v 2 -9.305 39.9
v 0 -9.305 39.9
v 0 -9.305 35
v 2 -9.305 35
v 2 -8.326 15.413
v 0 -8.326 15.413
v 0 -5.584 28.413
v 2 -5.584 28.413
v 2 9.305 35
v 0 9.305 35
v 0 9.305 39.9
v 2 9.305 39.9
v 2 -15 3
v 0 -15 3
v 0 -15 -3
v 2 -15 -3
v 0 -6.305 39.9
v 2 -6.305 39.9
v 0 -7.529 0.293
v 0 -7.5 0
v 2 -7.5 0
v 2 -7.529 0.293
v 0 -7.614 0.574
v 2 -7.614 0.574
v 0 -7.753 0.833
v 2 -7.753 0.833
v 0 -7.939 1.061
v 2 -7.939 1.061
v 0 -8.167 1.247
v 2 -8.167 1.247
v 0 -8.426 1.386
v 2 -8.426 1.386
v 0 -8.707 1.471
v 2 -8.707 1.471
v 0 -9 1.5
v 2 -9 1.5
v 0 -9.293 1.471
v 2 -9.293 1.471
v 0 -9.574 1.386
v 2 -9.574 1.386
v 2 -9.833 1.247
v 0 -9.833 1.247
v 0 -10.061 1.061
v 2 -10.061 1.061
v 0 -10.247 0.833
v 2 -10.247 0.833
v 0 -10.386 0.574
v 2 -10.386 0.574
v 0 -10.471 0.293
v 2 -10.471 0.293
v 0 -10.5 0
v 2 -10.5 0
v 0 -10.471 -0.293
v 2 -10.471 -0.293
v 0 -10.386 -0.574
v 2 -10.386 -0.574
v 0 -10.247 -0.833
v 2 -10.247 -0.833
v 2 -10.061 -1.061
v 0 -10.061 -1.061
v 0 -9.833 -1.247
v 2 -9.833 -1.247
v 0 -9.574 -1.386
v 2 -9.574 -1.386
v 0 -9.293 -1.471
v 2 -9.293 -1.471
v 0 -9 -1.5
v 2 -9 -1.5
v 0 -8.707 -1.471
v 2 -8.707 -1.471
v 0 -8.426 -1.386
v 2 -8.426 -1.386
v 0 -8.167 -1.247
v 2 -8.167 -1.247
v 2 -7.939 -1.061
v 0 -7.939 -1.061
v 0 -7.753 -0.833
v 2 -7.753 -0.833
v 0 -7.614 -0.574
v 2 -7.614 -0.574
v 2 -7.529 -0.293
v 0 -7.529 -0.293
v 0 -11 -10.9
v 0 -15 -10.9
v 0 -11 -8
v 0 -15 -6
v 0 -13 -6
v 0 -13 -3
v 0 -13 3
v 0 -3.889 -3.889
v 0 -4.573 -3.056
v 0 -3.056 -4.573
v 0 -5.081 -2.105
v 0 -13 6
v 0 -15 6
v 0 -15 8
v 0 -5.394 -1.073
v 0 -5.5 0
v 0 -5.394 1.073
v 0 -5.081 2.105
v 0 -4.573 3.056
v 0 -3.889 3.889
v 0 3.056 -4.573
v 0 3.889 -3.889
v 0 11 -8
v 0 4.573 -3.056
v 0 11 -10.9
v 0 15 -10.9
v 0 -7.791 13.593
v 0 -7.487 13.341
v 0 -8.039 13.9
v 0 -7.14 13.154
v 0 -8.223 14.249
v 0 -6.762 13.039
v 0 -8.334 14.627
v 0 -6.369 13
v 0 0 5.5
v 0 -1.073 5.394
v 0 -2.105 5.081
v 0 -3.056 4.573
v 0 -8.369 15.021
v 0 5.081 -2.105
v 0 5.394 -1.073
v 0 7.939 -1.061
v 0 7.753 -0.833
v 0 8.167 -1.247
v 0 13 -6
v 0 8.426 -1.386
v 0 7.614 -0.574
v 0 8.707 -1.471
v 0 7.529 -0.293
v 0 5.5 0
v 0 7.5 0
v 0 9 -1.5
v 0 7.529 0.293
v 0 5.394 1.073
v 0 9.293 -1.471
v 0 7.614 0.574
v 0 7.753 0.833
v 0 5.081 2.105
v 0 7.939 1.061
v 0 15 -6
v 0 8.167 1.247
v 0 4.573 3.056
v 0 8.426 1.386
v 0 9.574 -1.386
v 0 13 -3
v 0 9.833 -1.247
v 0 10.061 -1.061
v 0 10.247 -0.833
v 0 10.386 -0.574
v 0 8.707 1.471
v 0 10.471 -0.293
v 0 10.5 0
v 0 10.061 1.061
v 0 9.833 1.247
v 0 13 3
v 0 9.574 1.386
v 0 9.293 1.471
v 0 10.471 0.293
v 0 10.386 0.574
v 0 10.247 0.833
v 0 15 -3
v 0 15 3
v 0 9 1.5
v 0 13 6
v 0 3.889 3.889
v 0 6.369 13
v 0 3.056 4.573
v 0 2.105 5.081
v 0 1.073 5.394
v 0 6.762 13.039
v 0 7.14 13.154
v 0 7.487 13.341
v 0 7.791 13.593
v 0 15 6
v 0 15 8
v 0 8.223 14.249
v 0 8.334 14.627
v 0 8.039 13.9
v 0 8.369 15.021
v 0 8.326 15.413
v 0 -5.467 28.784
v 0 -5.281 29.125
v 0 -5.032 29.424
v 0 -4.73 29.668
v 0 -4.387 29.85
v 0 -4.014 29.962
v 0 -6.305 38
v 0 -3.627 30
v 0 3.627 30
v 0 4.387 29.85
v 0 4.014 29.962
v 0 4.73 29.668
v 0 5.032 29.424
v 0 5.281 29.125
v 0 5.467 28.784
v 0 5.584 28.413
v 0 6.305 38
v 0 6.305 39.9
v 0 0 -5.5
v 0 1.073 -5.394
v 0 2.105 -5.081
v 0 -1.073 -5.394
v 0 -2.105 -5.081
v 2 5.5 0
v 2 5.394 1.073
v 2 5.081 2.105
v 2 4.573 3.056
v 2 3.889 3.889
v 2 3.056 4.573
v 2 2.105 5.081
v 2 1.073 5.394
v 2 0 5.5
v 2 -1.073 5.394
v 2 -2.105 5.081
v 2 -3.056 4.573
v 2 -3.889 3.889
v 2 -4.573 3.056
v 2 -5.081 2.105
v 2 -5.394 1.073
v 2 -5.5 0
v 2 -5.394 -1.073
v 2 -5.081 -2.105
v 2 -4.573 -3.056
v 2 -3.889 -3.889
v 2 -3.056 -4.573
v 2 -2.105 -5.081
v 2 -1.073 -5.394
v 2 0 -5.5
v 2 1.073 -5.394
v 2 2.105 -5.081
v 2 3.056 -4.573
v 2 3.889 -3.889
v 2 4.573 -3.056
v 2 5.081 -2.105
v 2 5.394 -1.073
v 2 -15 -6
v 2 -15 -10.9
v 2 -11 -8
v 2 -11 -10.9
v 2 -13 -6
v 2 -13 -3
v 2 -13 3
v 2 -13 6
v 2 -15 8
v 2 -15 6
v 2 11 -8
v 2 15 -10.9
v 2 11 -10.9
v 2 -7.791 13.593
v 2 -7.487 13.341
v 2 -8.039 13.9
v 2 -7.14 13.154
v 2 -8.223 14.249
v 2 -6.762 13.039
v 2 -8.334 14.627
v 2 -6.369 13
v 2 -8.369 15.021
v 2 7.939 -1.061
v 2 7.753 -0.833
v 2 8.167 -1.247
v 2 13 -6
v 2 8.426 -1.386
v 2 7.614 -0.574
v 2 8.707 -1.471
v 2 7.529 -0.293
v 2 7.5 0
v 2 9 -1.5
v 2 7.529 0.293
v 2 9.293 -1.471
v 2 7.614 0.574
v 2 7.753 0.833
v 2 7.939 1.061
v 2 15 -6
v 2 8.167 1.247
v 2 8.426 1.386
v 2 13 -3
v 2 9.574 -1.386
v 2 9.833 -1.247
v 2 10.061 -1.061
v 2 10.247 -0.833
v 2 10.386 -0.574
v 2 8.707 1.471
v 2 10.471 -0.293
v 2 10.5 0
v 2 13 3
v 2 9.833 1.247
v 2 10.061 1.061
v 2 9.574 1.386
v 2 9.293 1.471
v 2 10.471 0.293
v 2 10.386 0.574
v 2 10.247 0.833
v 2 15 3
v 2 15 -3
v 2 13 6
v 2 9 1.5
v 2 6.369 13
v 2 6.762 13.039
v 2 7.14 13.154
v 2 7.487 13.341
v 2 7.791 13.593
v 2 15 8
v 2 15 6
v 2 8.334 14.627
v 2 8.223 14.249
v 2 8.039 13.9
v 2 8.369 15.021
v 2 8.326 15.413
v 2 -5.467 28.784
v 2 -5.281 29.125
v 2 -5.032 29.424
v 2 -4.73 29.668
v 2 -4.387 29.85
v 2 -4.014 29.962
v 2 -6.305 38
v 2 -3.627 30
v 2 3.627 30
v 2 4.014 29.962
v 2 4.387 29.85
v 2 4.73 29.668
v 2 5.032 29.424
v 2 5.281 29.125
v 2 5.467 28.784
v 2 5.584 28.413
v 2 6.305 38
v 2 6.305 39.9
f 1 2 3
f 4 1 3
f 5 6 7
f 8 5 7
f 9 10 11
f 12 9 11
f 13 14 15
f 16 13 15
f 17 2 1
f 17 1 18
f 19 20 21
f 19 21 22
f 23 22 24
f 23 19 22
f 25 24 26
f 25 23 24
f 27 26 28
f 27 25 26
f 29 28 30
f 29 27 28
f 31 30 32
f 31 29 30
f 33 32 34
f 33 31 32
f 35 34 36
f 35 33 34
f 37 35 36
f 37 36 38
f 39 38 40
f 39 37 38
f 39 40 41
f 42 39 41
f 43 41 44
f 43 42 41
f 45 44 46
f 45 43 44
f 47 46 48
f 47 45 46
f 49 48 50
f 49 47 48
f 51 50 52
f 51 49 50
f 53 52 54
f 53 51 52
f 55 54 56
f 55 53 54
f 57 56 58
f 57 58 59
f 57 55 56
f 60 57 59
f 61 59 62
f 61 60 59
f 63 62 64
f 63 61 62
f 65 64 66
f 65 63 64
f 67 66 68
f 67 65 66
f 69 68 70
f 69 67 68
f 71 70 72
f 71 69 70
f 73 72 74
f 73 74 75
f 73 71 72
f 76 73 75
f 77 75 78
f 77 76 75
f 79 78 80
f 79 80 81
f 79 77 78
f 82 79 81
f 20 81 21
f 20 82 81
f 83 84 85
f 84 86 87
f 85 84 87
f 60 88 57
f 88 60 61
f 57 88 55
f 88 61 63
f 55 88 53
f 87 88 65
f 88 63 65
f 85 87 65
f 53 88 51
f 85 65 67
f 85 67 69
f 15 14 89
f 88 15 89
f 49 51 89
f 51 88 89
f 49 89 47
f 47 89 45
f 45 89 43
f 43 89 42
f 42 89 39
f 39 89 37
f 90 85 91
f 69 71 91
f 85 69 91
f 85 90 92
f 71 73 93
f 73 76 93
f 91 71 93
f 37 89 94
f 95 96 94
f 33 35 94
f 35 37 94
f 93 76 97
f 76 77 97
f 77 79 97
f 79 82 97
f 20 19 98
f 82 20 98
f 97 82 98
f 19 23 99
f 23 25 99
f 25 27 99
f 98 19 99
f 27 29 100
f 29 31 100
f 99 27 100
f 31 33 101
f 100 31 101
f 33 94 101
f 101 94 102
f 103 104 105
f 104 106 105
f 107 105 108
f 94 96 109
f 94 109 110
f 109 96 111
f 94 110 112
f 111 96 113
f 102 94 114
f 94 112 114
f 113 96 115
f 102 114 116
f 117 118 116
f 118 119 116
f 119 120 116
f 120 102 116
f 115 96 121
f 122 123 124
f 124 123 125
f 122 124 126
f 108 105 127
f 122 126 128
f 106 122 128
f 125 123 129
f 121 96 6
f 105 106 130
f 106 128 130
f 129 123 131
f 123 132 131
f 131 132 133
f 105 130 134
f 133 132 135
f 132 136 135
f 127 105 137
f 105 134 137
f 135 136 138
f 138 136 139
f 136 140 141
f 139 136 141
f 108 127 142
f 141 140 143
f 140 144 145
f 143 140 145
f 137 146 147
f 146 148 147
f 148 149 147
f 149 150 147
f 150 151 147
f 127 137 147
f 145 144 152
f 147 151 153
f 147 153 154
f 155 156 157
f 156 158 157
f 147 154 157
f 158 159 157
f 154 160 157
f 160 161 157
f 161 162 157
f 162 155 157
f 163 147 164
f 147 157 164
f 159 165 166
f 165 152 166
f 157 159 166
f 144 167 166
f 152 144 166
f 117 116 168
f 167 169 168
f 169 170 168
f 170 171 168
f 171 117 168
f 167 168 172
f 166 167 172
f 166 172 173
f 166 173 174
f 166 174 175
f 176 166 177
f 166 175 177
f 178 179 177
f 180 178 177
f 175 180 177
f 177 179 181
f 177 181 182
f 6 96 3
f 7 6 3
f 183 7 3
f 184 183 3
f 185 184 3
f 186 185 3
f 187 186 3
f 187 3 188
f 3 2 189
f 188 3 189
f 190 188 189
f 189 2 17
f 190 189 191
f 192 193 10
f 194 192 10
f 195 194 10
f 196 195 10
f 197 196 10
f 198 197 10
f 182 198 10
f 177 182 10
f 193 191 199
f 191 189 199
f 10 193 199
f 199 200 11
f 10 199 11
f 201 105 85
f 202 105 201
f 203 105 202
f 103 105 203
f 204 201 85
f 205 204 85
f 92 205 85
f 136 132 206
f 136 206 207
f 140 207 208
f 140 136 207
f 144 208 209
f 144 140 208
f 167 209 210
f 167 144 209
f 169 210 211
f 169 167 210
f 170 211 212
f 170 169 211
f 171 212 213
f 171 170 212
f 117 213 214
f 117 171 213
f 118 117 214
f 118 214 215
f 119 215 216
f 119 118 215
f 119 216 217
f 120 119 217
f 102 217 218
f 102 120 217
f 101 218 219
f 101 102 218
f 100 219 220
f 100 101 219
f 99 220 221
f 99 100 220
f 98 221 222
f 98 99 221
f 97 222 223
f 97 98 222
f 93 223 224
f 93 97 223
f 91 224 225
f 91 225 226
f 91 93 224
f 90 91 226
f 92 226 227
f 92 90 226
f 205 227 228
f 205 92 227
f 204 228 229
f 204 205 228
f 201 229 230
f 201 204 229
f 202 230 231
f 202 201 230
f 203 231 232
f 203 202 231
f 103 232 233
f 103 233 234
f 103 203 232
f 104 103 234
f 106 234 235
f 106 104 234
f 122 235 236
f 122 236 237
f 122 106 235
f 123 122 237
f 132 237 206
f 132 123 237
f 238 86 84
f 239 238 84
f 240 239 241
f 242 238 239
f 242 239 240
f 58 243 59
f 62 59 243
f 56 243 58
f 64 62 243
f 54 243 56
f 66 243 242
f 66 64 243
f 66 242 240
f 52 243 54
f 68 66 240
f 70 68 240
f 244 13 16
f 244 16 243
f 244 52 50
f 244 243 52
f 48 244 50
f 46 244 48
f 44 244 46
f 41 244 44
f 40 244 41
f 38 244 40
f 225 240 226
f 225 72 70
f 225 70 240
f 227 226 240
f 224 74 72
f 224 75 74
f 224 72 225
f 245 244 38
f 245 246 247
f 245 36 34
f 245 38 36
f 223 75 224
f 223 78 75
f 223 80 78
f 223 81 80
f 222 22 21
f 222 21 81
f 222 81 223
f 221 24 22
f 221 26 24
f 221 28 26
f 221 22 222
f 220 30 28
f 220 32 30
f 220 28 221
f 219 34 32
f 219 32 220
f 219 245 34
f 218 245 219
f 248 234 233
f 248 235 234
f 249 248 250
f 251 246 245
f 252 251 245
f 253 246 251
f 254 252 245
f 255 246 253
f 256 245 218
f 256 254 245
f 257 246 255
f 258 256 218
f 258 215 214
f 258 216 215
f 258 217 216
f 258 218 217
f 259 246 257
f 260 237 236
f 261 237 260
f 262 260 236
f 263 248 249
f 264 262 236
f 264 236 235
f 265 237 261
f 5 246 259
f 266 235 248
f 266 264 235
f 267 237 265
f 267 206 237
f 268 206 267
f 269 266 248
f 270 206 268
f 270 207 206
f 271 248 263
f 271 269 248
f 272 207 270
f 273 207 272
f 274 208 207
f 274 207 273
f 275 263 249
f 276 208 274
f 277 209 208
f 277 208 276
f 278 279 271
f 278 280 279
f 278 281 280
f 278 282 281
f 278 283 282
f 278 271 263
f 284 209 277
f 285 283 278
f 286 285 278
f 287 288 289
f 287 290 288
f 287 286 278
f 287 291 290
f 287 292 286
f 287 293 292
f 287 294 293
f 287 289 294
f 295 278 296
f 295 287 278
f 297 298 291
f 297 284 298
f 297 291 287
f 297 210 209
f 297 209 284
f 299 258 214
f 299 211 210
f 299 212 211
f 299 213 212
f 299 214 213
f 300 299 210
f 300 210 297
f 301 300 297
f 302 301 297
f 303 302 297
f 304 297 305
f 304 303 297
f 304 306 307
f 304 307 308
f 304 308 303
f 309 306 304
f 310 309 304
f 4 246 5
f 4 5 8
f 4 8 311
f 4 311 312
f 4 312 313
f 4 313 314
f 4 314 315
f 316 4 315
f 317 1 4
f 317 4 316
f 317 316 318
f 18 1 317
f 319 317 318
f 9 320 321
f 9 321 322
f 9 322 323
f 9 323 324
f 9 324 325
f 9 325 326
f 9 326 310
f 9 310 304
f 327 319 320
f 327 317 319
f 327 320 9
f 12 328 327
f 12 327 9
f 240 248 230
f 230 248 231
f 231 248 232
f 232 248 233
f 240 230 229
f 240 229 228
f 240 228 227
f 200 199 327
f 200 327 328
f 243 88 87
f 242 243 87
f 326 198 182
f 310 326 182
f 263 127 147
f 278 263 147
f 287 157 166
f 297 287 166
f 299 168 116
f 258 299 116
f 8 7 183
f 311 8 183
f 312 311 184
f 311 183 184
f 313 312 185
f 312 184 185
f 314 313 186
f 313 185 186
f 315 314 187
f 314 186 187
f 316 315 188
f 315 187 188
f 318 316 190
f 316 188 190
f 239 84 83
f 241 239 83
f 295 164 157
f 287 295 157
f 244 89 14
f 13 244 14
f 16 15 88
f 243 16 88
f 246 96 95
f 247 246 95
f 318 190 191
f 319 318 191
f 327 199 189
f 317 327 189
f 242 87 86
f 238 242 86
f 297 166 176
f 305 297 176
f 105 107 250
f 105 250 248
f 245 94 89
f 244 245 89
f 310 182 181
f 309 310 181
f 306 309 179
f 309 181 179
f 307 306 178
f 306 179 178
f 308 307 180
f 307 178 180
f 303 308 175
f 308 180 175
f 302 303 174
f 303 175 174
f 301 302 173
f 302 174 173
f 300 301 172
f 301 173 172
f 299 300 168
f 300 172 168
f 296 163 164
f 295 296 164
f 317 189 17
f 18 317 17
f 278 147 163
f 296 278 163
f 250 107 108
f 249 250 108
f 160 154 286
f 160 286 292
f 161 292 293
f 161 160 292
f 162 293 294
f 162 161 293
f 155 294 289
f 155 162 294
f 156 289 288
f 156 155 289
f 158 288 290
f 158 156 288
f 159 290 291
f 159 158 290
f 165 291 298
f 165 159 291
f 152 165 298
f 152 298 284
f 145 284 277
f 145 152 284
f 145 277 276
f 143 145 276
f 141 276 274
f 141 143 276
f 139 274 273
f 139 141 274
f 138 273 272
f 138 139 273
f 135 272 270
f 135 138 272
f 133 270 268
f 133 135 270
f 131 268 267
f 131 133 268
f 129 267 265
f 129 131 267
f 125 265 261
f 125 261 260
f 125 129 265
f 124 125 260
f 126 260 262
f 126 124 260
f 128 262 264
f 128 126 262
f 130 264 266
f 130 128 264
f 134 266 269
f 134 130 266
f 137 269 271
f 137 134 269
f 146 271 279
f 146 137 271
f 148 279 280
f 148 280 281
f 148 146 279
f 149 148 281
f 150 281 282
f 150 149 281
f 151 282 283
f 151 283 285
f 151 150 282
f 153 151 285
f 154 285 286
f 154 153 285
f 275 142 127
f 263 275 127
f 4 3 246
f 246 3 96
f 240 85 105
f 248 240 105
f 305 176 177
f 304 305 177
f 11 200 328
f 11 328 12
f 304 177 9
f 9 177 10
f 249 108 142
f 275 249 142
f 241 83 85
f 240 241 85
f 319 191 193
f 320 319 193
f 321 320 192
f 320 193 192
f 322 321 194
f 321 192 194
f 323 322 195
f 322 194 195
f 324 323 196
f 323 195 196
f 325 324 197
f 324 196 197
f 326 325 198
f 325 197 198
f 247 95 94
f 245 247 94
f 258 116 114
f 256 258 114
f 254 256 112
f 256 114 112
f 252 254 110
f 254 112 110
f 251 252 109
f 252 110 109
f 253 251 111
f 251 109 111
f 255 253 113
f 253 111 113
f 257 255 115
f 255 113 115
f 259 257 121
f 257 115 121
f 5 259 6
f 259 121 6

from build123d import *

# Parameters (mm, degrees)
F0_W     = 4
F0_H     = 2.9
F0_W_2   = 3
F0_H_2   = 1.9
F0_R     = 1.5
F0_R_2   = 5.5
F1_DEPTH = 2
F2_DEPTH = 2


with BuildPart() as f1:
    # F0 (on Right) → F1 (new body)
    with BuildSketch(Plane.YZ):
        with Locations((-13, -9.45)):
            Rectangle(F0_W, F0_H)
        with Locations((13, -9.45)):
            Rectangle(F0_W, F0_H)
        with Locations((-7.80476, 38.95)):
            Rectangle(F0_W_2, F0_H_2)
        with Locations((7.80476, 38.95)):
            Rectangle(F0_W_2, F0_H_2)
        Polygon((-9.30476, 38), (-9.30476, 35), (9.30476, 35), (9.30476, 38), (6.30476, 38), (-6.30476, 38), align=None)
        Polygon((-15, -6), (-15, -8), (-11, -8), (11, -8), (15, -8), (15, -6), (13, -6), (13, -3), (15, -3), (15, 3), (13, 3), (13, 6), (15, 6), (15, 8), (-15, 8), (-15, 6), (-13, 6), (-13, 3), (-15, 3), (-15, -3), (-13, -3), (-13, -6), align=None)
        with Locations((-9, 0)):
            Circle(F0_R, mode=Mode.SUBTRACT)
        Circle(F0_R_2, mode=Mode.SUBTRACT)
        with Locations((9, 0)):
            Circle(F0_R, mode=Mode.SUBTRACT)
        Polygon((-9.30476, 35), (-15, 8), (15, 8), (9.30476, 35), align=None)
        with BuildLine():
            ThreePointArc((3.6272711829, 30), (4.8871178359, 29.5533146529), (5.5842094494, 28.4127864109))
            Line((5.5842094494, 28.4127864109), (8.326362042, 15.4127864109))
            ThreePointArc((8.326362042, 15.4127864109), (7.9227384284, 13.740153347), (6.3694237755, 13))
            Line((6.3694237755, 13), (-6.3694237755, 13))
            ThreePointArc((-6.3694237755, 13), (-7.9227384284, 13.740153347), (-8.326362042, 15.4127864109))
            Line((-8.326362042, 15.4127864109), (-5.5842094494, 28.4127864109))
            ThreePointArc((-5.5842094494, 28.4127864109), (-4.8871178359, 29.5533146529), (-3.6272711829, 30))
            Line((-3.6272711829, 30), (3.6272711829, 30))
        make_face(mode=Mode.SUBTRACT)
    extrude(amount=F1_DEPTH)

    # F0 (on Right) → F2 (join)
    with BuildSketch(Plane.YZ):
        Polygon((-9.30476, 35), (-15, 8), (15, 8), (9.30476, 35), align=None)
        with BuildLine():
            ThreePointArc((3.6272711829, 30), (4.8871178359, 29.5533146529), (5.5842094494, 28.4127864109))
            Line((5.5842094494, 28.4127864109), (8.326362042, 15.4127864109))
            ThreePointArc((8.326362042, 15.4127864109), (7.9227384284, 13.740153347), (6.3694237755, 13))
            Line((6.3694237755, 13), (-6.3694237755, 13))
            ThreePointArc((-6.3694237755, 13), (-7.9227384284, 13.740153347), (-8.326362042, 15.4127864109))
            Line((-8.326362042, 15.4127864109), (-5.5842094494, 28.4127864109))
            ThreePointArc((-5.5842094494, 28.4127864109), (-4.8871178359, 29.5533146529), (-3.6272711829, 30))
            Line((-3.6272711829, 30), (3.6272711829, 30))
        make_face(mode=Mode.SUBTRACT)
        Polygon((-15, -6), (-15, -8), (-11, -8), (11, -8), (15, -8), (15, -6), (13, -6), (13, -3), (15, -3), (15, 3), (13, 3), (13, 6), (15, 6), (15, 8), (-15, 8), (-15, 6), (-13, 6), (-13, 3), (-15, 3), (-15, -3), (-13, -3), (-13, -6), align=None)
        with Locations((-9, 0)):
            Circle(F0_R, mode=Mode.SUBTRACT)
        Circle(F0_R_2, mode=Mode.SUBTRACT)
        with Locations((9, 0)):
            Circle(F0_R, mode=Mode.SUBTRACT)
        with Locations((-13, -9.45)):
            Rectangle(F0_W, F0_H)
        with Locations((13, -9.45)):
            Rectangle(F0_W, F0_H)
        with Locations((7.80476, 38.95)):
            Rectangle(F0_W_2, F0_H_2)
        Polygon((-9.30476, 38), (-9.30476, 35), (9.30476, 35), (9.30476, 38), (6.30476, 38), (-6.30476, 38), align=None)
        with Locations((-7.80476, 38.95)):
            Rectangle(F0_W_2, F0_H_2)
    extrude(amount=F2_DEPTH)


solid = f1.part
